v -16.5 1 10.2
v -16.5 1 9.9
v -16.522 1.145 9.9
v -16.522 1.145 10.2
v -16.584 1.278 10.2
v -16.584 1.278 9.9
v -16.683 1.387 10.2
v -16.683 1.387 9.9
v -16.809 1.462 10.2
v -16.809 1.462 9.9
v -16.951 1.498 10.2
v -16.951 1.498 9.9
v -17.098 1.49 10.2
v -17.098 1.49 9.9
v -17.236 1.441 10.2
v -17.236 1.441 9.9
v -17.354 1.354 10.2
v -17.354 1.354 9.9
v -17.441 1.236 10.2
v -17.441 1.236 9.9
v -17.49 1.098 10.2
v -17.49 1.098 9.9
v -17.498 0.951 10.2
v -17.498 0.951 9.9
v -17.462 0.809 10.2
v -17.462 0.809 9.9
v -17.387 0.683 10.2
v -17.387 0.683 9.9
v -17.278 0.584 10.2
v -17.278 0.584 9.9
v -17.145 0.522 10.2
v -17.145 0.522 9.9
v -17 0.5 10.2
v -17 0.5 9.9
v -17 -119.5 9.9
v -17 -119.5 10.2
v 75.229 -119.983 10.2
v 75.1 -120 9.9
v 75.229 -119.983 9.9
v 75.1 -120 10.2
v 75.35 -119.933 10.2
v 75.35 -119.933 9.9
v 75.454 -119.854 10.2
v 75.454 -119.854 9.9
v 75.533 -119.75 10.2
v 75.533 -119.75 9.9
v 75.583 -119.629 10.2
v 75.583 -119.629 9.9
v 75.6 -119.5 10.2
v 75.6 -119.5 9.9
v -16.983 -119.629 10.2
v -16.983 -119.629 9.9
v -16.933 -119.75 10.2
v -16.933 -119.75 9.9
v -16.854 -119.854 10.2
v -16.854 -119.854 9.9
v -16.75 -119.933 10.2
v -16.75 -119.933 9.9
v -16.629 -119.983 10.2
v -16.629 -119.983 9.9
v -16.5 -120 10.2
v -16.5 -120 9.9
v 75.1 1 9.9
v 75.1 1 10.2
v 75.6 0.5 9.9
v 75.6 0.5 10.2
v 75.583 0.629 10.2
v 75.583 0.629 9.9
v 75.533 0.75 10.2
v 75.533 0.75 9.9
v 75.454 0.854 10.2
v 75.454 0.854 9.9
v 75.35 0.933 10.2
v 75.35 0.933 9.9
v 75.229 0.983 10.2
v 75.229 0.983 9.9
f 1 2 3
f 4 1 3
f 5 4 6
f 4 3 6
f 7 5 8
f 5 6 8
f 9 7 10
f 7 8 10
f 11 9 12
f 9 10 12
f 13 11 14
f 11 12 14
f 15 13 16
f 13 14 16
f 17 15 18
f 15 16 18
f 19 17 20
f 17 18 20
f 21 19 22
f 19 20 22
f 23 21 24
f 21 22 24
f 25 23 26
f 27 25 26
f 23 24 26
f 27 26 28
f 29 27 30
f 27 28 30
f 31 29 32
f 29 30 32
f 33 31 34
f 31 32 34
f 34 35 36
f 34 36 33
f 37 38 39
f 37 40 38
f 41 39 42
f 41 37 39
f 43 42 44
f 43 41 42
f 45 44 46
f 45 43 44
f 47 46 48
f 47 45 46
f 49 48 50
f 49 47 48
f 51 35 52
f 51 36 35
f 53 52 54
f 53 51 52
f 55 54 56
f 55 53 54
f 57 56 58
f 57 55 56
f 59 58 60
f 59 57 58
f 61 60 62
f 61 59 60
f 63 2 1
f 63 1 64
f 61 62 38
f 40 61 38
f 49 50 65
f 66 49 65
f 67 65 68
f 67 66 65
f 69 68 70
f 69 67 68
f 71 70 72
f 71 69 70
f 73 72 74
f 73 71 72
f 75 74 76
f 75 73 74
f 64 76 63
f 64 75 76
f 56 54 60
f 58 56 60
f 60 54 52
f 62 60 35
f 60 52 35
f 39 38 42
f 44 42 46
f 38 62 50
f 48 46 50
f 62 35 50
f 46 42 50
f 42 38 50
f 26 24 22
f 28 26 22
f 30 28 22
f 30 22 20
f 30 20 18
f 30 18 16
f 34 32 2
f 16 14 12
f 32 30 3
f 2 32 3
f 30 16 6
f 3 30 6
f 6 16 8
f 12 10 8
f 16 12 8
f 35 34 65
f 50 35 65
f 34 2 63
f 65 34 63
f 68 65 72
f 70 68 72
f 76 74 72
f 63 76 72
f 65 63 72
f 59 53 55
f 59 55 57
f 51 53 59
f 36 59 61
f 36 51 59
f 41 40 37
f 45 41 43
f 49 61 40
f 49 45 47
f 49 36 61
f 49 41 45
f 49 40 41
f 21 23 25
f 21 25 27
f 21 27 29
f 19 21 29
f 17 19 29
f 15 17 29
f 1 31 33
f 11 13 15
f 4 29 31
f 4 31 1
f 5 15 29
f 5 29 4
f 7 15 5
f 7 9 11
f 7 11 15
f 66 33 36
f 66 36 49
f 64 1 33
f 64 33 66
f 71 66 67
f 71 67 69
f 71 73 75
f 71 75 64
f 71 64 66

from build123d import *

# Parameters (mm, degrees)
CYLINDER_R     = 0.5
CYLINDER_DEPTH = 0.3
BOX003_W       = 92.6
BOX003_H       = 121
BOX003_DEPTH   = 0.3
FILLET001_R    = 0.5
FILLET002_R    = 0.5
FILLET003_R    = 0.5
FILLET004_R    = 0.5


with BuildPart() as cylinder:
    # Cylinder → Cylinder (new body)
    with BuildSketch(Plane(origin=(-17, 1, 10), x_dir=(1, 0, 0), z_dir=(0, 0, 1))):
        Circle(CYLINDER_R)
    extrude(amount=CYLINDER_DEPTH)


with BuildPart() as displaybase001:
    # Box003 → Box003 (new body)
    with BuildSketch(Plane(origin=(-17, -120, 10), x_dir=(1, 0, 0), z_dir=(0, 0, 1))):
        with Locations((46.3, 60.5)):
            Rectangle(BOX003_W, BOX003_H)
    extrude(amount=BOX003_DEPTH)

    # Fillet001
    fillet001_edges = [displaybase001.edges().sort_by_distance(p)[0] for p in [
        (-17, 1, 10.15),
    ]]
    fillet(fillet001_edges, radius=FILLET001_R)

    # Fillet002
    fillet002_edges = [displaybase001.edges().sort_by_distance(p)[0] for p in [
        (-17, -120, 10.15),
    ]]
    fillet(fillet002_edges, radius=FILLET002_R)

    # Fillet003
    fillet003_edges = [displaybase001.edges().sort_by_distance(p)[0] for p in [
        (75.6, -120, 10.15),
    ]]
    fillet(fillet003_edges, radius=FILLET003_R)

    # Fillet004
    fillet004_edges = [displaybase001.edges().sort_by_distance(p)[0] for p in [
        (75.6, 1, 10.15),
    ]]
    fillet(fillet004_edges, radius=FILLET004_R)

    # Fusion: union Cylinder
    add(cylinder.part)


with BuildPart() as displaybase001_1:
    # Fusion placement: moved
    add(displaybase001.part.moved(Location((0, 0, -0.1))))


solid = displaybase001_1.part
